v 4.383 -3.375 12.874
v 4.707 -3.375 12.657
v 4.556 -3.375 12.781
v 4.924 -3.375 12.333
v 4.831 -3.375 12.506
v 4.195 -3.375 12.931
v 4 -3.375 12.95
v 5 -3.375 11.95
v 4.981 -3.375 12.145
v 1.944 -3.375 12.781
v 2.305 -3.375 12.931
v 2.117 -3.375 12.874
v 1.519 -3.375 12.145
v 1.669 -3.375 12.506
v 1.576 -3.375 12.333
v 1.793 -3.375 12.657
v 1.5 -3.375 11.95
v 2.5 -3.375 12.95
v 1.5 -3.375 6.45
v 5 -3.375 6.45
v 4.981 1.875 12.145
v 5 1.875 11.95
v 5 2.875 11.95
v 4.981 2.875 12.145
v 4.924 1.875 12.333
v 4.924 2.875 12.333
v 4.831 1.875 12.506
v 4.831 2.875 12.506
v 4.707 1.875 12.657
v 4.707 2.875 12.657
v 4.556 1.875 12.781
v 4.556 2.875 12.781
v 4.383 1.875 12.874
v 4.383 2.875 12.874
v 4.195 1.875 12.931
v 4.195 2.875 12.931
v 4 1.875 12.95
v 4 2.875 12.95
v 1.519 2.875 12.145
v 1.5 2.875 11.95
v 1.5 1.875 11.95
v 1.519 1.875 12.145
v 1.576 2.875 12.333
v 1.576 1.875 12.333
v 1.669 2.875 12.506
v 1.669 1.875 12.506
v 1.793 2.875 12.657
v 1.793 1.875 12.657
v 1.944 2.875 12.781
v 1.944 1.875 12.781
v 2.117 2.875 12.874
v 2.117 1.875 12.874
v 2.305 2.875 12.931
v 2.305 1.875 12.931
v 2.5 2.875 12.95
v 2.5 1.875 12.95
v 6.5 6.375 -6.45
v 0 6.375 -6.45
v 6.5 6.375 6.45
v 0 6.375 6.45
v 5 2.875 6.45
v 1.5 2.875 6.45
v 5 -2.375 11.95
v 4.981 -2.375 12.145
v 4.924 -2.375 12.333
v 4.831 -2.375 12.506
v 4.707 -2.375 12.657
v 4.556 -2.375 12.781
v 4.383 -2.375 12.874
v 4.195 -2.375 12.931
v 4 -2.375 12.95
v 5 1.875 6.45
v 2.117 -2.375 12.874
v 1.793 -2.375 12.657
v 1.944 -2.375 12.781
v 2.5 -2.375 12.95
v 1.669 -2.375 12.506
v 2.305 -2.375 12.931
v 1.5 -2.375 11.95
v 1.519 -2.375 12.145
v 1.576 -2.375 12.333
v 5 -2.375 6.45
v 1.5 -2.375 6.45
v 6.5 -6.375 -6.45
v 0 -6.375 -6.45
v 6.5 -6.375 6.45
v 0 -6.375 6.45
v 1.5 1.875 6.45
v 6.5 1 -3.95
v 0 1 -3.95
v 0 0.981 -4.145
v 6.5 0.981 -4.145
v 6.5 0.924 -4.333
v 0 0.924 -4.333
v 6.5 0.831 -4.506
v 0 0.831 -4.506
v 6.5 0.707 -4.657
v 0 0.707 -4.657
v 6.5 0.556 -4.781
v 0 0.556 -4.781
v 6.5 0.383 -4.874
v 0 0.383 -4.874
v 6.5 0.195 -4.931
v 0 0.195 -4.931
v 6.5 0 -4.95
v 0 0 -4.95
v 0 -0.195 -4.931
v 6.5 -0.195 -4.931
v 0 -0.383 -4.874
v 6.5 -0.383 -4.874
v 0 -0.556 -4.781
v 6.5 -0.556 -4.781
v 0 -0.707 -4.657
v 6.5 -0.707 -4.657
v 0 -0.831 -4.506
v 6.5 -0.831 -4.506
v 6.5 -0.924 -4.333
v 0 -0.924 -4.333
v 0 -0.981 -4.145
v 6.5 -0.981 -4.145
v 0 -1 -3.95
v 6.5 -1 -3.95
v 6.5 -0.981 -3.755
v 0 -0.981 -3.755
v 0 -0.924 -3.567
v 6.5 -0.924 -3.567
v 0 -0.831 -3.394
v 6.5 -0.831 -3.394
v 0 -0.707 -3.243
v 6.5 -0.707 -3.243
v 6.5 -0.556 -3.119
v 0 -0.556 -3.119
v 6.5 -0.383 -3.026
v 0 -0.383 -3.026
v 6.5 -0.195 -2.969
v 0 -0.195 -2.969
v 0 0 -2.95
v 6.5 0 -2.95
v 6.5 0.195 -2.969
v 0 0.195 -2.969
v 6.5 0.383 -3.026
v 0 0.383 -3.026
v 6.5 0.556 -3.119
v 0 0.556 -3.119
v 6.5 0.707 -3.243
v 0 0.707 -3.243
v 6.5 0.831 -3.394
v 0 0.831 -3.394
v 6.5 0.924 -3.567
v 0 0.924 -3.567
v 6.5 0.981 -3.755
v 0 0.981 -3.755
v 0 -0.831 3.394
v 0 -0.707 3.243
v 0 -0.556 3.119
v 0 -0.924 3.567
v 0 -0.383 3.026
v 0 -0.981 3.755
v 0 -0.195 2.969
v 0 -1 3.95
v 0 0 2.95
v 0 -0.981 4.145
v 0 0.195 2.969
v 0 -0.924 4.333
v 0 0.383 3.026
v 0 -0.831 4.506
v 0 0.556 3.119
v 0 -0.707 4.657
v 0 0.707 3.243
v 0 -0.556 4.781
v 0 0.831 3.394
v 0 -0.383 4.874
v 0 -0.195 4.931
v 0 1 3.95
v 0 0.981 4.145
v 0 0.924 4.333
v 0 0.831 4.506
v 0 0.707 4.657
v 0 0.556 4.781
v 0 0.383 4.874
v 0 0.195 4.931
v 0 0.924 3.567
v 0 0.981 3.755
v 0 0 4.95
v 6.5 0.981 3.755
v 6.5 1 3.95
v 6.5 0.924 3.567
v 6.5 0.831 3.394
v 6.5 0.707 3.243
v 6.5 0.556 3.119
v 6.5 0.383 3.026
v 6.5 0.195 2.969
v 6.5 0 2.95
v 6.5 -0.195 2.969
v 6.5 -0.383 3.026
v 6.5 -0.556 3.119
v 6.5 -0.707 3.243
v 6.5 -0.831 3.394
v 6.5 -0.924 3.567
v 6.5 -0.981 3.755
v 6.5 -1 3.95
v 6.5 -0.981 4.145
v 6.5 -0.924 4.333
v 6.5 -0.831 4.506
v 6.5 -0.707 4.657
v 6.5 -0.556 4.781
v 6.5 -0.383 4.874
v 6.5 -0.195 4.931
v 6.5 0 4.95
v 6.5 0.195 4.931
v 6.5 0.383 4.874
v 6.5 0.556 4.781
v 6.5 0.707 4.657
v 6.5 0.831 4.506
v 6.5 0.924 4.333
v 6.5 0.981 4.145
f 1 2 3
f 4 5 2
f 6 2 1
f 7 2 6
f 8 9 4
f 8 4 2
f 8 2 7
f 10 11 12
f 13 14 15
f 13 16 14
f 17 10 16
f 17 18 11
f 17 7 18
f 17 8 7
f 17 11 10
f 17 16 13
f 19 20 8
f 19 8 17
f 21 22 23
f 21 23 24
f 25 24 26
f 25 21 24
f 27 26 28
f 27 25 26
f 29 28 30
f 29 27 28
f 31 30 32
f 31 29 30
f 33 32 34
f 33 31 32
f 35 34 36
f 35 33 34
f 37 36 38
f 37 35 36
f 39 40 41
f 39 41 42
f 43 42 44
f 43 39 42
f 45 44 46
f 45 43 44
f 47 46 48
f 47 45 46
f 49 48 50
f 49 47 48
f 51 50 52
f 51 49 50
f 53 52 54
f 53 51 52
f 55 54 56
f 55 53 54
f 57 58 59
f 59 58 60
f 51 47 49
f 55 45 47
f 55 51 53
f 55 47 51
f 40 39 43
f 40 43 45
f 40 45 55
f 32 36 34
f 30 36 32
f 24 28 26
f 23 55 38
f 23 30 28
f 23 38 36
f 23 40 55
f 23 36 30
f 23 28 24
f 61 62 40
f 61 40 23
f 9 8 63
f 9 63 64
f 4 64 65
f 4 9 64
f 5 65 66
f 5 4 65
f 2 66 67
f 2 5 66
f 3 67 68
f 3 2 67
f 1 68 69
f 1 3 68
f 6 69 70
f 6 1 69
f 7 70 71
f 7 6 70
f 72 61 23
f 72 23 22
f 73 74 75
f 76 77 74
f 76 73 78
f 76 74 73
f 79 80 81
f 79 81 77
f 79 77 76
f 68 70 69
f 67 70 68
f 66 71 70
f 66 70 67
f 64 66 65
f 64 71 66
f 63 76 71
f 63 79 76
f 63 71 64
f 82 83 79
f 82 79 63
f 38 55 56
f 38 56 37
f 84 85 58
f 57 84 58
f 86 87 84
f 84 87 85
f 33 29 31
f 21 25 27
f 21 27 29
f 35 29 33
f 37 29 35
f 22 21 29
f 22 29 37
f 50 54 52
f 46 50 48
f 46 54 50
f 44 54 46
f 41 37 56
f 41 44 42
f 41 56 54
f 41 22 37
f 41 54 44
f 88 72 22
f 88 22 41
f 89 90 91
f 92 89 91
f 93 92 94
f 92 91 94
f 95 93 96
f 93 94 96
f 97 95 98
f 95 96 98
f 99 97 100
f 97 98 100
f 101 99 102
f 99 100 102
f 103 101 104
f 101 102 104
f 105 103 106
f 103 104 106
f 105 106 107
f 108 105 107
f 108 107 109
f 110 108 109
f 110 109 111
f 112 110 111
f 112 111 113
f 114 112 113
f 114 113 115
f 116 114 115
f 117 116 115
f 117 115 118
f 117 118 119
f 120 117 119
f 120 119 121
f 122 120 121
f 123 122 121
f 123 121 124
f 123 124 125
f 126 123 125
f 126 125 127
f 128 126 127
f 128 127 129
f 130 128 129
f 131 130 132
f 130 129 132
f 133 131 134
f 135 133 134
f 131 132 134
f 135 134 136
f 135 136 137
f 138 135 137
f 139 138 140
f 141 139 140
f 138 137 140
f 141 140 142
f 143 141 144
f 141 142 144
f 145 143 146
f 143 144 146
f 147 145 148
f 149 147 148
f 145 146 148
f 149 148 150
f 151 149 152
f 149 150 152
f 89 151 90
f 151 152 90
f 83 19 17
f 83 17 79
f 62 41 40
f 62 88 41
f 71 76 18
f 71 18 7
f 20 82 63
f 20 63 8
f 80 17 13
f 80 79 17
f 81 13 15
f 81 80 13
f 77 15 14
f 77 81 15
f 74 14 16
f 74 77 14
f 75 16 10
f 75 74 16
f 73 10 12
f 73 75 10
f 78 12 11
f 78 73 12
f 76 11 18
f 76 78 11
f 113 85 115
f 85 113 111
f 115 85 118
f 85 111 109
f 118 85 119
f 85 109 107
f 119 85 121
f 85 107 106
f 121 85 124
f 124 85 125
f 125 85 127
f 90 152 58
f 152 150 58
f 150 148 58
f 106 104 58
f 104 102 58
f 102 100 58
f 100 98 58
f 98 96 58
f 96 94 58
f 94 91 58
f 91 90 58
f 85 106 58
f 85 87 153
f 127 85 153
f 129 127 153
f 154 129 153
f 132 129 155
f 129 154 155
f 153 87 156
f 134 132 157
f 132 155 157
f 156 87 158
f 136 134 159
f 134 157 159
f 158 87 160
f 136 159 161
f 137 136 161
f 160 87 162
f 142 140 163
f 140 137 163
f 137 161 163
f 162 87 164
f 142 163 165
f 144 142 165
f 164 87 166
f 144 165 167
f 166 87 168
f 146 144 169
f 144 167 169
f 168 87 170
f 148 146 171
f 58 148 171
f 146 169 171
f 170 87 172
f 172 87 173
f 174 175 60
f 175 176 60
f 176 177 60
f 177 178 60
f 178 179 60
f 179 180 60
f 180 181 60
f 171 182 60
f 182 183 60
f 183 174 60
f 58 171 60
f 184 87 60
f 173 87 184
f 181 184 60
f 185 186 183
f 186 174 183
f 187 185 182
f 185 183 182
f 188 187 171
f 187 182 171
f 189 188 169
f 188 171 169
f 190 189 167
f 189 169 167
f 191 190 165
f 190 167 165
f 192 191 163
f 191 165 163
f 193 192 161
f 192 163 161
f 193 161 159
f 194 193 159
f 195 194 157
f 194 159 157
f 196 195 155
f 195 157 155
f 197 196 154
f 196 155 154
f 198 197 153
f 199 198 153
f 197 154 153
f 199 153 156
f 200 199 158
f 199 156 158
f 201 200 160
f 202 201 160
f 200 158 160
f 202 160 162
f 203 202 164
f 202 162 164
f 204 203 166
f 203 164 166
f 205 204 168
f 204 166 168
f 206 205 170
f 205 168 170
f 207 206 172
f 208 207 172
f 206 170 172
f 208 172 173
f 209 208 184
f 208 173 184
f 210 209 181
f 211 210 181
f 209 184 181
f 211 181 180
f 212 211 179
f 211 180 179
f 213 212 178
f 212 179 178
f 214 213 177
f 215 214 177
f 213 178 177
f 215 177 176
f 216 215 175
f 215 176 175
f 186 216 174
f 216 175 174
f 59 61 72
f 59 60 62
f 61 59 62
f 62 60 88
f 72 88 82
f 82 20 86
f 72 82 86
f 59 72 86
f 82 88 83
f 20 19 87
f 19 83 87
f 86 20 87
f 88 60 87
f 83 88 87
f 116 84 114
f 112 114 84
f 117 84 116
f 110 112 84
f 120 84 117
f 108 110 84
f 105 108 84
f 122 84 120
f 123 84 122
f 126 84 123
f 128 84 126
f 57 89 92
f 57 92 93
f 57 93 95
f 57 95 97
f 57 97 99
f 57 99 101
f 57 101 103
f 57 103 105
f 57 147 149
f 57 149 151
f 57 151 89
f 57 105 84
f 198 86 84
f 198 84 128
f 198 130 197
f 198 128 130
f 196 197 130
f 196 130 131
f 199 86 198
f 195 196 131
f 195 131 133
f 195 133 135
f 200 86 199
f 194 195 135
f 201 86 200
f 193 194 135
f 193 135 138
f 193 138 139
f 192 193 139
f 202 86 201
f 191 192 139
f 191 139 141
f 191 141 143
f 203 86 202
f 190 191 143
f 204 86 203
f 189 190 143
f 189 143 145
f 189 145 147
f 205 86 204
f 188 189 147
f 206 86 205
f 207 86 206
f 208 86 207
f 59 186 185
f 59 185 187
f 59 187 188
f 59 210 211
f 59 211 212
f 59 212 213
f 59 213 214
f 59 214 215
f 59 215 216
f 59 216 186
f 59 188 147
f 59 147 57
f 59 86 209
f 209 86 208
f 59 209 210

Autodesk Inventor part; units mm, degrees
ref_plane "YZ Plane" through (0, 0, 0) normal (1, 0, 0) x (0, 1, 0)
ref_plane "XZ Plane" through (0, 0, 0) normal (0, 1, 0) x (-1, 0, 0)
ref_plane "XY Plane" through (0, 0, 0) normal (0, 0, 1) x (1, 0, 0)
sketch "Sketch1" plane through (0, 0, 0) normal (1, 0, 0) x (0, 1, 0)
  line L0 (6.375, 6.45) -> (-6.375, 6.45)
  line L1 (-6.375, 6.45) -> (-6.375, -6.45)
  line L2 (-6.375, -6.45) -> (6.375, -6.45)
  line L3 (6.375, -6.45) -> (6.375, 6.45)
  line L4 (6.375, 6.45) -> (-6.375, -6.45) construction
  line L5 (-6.375, 6.45) -> (6.375, -6.45) construction
  circle A0 centre (0, -3.95) radius 1
  circle A1 centre (0, 3.95) radius 1
  line L6 (0, 6.45) -> (0, -6.45)
  point P0 (0, 0)
  dimension "d0" = 12.75
  dimension "d1" = 12.9
  dimension "d2" = 2
  dimension "d3" = 2.5
  dimension "d4" = 2
  dimension "d5" = 2.5
extrude "Extrusion1" add sketch "Sketch1" along normal blind 6.5 contours L3 L2 L6 A0 A1 L0 | L6 A1 A0 L2 L1 L0
sketch "Sketch2" plane through (0, -6.375, 6.45) normal (0, 0, 1) x (1, 0, 0)
  line L0 (1.5, 9.25) -> (5, 9.25)
  line L1 (5, 9.25) -> (5, 8.25)
  line L2 (5, 8.25) -> (1.5, 8.25)
  line L3 (1.5, 8.25) -> (1.5, 9.25)
  line L4 (1.5, 9.25) -> (5, 8.25) construction
  line L5 (5, 9.25) -> (1.5, 8.25) construction
  line L6 (1.5, 4) -> (5, 4)
  line L7 (5, 4) -> (5, 3)
  line L8 (5, 3) -> (1.5, 3)
  line L9 (1.5, 3) -> (1.5, 4)
  line L10 (1.5, 4) -> (5, 3) construction
  line L11 (5, 4) -> (1.5, 3) construction
  line L12 (0, 12.75) -> (6.5, 12.75) projected
  line L13 (3.25, 12.75) -> (3.25, 0)
  line L14 (0, 0) -> (6.5, 0) projected
  point P0 (0, 6.375)
  point P1 (3.25, 8.75)
  point P2 (3.25, 3.5)
  point P3 (3.25, 8.75)
  point P4 (3.25, 3.5)
  dimension "d8" = 3.5
  dimension "d9" = 1
  dimension "d12" = 3.5
  dimension "d13" = 3.5
extrude "Extrusion2" add sketch "Sketch2" along normal blind 6.5
fillet "Fillet1" radius 1 4 edges at (5, 2.375, 12.95) (1.5, 2.375, 12.95) (1.5, -2.875, 12.95) (5, -2.875, 12.95)
equation "\"d13\" = d12"
properties part number "Switch"
